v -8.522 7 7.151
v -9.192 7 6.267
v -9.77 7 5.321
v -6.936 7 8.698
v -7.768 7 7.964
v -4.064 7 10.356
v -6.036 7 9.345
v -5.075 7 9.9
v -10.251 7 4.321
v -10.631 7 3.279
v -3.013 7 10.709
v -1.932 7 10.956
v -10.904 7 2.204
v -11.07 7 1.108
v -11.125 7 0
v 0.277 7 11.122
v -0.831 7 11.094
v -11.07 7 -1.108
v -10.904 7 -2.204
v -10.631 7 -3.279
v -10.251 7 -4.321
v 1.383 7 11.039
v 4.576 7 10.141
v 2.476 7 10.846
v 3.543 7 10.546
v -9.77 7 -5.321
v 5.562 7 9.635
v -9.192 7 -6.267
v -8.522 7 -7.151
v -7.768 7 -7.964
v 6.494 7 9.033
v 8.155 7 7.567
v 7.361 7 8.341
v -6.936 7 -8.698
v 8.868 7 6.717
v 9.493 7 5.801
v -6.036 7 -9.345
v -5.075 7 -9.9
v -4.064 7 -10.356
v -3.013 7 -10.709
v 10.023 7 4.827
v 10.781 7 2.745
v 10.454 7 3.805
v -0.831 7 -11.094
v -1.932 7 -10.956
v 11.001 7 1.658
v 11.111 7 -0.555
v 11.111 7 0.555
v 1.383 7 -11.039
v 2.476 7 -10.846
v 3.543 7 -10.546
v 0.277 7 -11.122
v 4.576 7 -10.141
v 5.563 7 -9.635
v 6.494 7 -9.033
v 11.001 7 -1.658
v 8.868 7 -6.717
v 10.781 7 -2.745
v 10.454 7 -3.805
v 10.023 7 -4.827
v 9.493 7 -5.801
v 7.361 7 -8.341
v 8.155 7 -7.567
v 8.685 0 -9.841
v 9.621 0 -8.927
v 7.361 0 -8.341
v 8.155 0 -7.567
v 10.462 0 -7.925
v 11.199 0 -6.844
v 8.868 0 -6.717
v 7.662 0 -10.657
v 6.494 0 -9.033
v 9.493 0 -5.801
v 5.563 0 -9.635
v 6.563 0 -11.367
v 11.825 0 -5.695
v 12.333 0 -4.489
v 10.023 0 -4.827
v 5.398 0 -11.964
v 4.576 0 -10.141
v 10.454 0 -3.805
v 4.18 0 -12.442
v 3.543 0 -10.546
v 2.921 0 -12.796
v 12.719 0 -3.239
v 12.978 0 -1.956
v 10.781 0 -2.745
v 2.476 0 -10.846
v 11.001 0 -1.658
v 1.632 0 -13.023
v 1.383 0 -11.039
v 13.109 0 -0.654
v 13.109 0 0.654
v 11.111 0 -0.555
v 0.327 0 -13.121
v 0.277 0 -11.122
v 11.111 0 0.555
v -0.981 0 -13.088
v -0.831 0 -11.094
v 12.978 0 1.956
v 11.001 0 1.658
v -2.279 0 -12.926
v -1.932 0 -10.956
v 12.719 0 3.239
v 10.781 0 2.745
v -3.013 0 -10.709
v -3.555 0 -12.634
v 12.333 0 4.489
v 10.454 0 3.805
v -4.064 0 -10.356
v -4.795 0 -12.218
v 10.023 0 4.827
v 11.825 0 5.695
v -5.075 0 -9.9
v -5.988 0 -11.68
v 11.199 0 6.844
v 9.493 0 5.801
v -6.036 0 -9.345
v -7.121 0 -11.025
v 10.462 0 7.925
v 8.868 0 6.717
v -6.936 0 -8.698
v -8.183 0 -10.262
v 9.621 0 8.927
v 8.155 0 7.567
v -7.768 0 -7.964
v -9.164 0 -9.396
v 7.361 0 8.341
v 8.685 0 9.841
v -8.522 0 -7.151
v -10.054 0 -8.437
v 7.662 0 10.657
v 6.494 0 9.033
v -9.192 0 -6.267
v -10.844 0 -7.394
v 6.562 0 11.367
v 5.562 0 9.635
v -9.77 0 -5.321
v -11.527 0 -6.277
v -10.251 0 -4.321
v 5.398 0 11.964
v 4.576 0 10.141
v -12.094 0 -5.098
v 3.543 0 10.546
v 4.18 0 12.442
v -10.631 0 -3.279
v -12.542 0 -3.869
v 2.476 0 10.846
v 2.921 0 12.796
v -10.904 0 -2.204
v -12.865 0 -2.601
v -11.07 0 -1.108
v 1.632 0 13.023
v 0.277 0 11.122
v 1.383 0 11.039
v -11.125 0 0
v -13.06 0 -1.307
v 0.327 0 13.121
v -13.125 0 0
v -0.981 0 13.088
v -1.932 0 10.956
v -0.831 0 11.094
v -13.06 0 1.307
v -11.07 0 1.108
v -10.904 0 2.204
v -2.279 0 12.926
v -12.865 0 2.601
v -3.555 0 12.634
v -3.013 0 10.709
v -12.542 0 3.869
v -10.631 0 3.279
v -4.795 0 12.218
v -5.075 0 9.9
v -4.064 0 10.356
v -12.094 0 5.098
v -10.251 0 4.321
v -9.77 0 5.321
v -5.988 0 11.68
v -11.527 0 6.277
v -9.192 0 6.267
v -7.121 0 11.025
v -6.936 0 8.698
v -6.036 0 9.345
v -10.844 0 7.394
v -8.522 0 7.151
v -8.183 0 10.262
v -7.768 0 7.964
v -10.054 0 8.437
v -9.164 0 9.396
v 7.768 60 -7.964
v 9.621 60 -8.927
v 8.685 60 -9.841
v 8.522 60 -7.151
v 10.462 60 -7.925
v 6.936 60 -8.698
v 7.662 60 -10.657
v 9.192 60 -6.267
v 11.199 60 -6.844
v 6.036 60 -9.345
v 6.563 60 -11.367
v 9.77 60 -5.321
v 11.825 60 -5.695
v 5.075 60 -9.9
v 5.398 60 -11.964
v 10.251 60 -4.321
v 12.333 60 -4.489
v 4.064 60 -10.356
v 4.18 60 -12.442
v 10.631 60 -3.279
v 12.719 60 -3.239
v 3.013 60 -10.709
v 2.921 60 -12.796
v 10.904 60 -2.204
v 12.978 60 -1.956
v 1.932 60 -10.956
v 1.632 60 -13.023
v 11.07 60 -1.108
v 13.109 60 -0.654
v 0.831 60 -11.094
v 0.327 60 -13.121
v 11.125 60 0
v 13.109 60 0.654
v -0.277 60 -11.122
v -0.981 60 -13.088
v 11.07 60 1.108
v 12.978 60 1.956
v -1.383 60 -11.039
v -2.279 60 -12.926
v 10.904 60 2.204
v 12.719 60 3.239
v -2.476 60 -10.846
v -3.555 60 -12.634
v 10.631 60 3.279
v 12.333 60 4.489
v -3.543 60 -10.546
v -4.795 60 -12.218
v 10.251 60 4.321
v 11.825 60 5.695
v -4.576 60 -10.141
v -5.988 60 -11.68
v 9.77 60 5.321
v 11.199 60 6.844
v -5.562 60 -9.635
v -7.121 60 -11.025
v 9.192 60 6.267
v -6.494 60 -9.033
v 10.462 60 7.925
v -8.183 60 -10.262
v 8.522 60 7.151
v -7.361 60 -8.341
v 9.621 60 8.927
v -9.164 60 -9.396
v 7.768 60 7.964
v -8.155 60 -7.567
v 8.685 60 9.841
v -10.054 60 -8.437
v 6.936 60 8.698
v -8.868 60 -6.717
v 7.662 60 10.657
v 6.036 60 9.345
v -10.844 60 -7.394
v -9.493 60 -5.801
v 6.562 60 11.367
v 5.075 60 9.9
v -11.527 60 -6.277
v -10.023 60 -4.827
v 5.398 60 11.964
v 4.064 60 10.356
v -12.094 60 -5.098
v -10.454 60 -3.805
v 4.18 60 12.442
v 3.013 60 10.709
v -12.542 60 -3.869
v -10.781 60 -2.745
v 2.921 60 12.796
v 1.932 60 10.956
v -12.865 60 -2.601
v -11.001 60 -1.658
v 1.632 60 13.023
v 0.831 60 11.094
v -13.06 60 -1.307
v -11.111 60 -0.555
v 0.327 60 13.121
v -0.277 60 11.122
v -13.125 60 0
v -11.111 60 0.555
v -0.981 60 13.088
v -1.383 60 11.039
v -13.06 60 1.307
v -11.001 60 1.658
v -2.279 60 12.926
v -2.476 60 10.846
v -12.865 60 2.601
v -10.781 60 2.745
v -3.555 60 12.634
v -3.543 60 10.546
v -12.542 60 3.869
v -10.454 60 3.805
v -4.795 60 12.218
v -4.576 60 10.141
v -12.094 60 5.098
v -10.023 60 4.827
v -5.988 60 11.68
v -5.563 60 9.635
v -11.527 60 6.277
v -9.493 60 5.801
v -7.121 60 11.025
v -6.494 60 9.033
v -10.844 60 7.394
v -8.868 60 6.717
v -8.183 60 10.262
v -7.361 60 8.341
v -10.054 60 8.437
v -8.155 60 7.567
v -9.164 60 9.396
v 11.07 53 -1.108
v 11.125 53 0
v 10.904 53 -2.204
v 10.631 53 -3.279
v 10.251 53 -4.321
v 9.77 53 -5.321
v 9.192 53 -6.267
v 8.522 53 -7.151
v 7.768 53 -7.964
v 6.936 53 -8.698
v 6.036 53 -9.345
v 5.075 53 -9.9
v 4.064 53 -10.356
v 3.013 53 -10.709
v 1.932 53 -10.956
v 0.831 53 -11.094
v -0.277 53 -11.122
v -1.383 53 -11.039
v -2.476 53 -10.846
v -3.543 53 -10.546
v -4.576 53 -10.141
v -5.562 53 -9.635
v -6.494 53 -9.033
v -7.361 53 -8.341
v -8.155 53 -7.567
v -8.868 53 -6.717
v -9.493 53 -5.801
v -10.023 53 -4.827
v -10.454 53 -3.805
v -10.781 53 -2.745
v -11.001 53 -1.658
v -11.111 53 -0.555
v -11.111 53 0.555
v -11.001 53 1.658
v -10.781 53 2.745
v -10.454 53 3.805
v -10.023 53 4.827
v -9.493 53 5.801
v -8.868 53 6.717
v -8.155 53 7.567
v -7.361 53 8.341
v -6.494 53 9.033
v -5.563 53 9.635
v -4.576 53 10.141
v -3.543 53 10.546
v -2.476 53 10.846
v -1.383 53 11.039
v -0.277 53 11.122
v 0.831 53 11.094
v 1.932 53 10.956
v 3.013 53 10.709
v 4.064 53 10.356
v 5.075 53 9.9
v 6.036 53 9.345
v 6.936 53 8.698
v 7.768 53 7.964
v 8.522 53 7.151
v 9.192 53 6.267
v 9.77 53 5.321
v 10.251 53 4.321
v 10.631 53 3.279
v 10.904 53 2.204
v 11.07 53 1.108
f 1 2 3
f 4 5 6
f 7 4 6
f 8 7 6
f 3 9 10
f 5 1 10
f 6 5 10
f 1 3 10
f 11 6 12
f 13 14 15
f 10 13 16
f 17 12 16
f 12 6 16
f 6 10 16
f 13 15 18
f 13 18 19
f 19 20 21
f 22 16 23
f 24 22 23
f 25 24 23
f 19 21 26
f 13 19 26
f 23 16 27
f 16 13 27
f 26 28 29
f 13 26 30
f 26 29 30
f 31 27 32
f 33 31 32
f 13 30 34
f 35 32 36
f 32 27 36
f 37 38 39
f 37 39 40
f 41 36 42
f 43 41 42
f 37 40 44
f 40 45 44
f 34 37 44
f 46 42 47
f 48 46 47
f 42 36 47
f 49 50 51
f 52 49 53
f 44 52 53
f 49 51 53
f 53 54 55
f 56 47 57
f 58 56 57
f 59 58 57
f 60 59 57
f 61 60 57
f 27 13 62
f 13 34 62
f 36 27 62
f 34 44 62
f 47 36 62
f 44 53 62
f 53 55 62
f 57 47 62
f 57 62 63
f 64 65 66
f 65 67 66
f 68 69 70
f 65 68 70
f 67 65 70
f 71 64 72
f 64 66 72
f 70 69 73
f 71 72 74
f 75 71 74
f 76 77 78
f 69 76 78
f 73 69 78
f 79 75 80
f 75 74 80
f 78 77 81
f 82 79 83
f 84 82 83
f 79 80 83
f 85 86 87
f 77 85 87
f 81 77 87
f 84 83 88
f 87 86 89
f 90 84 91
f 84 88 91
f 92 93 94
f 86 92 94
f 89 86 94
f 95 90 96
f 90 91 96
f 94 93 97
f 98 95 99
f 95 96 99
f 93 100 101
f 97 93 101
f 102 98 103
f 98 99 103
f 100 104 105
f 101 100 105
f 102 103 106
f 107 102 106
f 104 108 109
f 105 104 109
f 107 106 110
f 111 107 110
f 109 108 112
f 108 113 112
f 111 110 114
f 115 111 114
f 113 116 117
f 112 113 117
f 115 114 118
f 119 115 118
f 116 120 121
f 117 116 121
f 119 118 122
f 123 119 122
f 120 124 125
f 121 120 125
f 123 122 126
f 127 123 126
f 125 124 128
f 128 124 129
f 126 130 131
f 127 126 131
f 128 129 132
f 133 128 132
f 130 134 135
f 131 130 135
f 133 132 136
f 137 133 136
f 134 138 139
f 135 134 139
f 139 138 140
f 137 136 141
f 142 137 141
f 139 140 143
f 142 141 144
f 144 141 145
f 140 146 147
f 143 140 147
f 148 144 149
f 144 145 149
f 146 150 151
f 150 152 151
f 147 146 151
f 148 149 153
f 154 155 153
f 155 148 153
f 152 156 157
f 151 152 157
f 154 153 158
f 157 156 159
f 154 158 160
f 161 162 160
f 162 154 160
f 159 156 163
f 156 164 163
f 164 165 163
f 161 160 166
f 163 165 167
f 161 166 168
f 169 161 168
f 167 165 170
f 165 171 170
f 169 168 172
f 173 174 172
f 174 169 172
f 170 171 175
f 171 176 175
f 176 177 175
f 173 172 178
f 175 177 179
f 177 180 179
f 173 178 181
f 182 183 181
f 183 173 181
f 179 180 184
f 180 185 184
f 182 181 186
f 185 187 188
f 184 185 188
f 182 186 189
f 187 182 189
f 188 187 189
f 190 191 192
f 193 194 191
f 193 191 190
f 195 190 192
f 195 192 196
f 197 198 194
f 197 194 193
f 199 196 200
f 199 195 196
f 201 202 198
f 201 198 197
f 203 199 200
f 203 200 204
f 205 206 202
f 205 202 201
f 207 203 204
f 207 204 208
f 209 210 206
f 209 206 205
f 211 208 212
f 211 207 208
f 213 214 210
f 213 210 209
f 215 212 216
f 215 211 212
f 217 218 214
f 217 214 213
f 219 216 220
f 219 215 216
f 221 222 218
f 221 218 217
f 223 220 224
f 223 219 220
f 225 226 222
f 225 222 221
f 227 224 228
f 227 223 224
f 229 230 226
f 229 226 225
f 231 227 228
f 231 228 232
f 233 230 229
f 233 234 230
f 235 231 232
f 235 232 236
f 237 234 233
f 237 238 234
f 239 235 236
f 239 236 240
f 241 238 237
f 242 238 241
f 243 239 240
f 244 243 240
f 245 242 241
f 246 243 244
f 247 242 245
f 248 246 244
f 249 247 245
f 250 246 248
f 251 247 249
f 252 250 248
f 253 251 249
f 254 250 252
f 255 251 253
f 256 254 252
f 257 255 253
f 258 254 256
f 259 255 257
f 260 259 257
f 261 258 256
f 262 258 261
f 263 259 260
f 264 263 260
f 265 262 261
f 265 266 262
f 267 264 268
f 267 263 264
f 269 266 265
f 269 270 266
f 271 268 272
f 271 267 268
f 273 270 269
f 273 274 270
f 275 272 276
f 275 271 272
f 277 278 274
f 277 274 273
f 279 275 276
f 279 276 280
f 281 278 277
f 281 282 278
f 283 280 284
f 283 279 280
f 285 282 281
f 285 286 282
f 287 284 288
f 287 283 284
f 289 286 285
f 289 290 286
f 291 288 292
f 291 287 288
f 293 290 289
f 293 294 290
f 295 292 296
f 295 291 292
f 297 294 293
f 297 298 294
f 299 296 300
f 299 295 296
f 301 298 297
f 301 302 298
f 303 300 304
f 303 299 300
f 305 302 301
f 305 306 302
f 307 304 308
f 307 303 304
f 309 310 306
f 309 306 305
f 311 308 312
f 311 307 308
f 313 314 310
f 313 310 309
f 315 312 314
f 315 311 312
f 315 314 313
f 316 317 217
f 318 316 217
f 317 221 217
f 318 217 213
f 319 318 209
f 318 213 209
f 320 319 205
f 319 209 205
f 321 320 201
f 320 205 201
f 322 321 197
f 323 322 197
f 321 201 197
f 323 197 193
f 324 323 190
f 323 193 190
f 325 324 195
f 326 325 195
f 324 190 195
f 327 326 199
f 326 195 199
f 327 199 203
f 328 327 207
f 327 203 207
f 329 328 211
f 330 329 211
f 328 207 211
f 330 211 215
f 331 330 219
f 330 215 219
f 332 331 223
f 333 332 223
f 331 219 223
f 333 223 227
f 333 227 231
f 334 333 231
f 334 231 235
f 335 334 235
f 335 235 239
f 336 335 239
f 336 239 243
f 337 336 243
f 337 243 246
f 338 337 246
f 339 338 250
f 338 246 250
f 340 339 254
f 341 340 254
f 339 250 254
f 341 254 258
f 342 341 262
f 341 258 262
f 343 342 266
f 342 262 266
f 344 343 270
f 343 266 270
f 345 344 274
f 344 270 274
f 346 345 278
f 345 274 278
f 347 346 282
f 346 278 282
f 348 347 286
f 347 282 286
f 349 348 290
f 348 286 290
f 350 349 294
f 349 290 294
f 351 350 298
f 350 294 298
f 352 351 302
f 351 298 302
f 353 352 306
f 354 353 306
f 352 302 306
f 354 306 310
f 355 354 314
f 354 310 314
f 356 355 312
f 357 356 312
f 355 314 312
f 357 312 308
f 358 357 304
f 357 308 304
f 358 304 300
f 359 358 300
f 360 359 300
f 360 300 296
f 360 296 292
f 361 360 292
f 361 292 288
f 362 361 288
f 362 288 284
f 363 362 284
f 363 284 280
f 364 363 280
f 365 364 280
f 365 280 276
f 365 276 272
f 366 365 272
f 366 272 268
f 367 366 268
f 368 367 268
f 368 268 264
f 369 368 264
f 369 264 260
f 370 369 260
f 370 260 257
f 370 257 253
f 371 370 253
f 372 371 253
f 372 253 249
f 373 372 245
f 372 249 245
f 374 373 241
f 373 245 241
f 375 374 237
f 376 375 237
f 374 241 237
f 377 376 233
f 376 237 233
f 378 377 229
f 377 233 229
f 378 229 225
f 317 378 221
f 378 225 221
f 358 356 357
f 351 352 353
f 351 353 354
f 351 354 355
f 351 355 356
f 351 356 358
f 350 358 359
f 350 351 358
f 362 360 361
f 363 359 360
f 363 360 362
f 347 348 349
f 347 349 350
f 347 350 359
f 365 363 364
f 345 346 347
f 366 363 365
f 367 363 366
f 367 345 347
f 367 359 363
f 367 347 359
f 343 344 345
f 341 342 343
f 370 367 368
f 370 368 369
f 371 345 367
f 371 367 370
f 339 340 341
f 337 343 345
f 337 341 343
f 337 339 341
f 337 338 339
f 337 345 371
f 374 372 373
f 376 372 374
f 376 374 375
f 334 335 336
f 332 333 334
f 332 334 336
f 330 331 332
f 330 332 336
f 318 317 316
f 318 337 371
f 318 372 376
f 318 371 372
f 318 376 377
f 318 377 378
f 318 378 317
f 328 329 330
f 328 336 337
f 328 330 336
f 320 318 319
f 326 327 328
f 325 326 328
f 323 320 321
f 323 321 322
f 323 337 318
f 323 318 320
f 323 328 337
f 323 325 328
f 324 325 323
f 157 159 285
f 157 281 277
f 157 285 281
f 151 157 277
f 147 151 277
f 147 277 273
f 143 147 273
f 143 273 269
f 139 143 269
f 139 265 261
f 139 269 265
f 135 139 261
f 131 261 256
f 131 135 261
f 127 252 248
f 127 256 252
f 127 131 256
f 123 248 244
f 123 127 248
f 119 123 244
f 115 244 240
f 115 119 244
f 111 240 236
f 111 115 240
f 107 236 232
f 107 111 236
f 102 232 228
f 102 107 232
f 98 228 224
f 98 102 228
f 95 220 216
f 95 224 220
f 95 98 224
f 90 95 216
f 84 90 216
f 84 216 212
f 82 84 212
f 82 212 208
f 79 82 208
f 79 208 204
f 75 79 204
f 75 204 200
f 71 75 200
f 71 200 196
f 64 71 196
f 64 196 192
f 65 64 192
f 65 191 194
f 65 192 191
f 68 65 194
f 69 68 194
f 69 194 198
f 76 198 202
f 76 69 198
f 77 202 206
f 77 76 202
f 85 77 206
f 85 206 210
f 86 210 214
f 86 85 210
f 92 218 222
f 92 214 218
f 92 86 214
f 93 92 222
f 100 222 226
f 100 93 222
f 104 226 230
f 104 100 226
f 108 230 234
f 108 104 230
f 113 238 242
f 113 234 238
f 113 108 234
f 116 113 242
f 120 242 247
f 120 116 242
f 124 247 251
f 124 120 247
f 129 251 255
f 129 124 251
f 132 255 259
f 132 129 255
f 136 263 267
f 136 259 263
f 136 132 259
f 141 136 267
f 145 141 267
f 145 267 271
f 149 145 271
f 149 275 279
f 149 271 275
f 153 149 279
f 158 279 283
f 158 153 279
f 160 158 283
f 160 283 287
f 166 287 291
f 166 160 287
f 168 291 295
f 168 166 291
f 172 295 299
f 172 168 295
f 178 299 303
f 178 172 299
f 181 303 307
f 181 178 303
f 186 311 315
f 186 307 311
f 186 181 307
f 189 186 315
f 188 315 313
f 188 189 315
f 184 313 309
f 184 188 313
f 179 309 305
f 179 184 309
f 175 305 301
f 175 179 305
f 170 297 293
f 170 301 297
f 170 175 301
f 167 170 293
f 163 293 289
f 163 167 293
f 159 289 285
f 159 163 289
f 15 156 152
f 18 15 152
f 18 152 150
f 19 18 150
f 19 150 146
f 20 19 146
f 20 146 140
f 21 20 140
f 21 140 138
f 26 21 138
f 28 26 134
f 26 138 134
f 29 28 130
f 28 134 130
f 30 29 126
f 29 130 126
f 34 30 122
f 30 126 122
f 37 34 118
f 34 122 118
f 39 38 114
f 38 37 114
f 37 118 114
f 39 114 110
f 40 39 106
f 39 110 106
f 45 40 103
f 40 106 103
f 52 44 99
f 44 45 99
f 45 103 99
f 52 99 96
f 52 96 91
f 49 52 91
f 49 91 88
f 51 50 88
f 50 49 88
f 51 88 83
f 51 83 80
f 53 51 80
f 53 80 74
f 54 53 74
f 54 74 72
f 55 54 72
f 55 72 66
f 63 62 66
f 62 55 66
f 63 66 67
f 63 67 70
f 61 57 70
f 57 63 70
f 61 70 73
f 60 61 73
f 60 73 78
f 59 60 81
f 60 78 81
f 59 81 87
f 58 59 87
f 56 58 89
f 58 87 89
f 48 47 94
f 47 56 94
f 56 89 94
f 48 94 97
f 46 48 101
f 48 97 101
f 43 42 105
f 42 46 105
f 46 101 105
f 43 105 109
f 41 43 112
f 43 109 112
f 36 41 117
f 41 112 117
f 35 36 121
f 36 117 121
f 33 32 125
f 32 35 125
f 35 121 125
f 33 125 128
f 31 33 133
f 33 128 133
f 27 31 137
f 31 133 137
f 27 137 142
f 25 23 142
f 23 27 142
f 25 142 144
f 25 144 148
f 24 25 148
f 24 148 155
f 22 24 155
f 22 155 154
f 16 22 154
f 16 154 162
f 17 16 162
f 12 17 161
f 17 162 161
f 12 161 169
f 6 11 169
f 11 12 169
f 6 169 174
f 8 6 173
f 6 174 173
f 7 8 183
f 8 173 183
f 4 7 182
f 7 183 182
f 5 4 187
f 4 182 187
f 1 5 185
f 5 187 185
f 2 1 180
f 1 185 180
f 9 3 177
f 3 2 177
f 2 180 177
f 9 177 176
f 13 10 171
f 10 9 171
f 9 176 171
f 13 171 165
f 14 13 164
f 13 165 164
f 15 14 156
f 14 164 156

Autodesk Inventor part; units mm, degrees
ref_plane "YZ Plane" through (0, 0, 0) normal (1, 0, 0) x (0, 1, 0)
ref_plane "XZ Plane" through (0, 0, 0) normal (0, 1, 0) x (-1, 0, 0)
ref_plane "XY Plane" through (0, 0, 0) normal (0, 0, 1) x (1, 0, 0)
sketch "Sketch1" plane through (0, 0, 0) normal (0, 1, 0) x (-1, 0, 0)
  circle A0 centre (0, 0) radius 11.125
  circle A1 centre (0, 0) radius 13.125
  dimension "d0" = 22.25
  dimension "d1" = 26.25
extrude "Extrusion1" add sketch "Sketch1" along normal blind 60
sketch "Sketch2" plane through (0, 60, 0) normal (0, 1, 0) x (1, 0, 0)
  circle A0 centre (0, 0) radius 11.125
extrude "Extrusion2" add sketch "Sketch2" against normal blind 53
sketch "Sketch3" plane through (0, 60, 0) normal (0, 1, 0) x (1, 0, 0)
  circle A0 centre (0, 0) radius 11.125
extrude "Extrusion3" cut sketch "Sketch3" against normal blind 7
properties part number "Fretter"
